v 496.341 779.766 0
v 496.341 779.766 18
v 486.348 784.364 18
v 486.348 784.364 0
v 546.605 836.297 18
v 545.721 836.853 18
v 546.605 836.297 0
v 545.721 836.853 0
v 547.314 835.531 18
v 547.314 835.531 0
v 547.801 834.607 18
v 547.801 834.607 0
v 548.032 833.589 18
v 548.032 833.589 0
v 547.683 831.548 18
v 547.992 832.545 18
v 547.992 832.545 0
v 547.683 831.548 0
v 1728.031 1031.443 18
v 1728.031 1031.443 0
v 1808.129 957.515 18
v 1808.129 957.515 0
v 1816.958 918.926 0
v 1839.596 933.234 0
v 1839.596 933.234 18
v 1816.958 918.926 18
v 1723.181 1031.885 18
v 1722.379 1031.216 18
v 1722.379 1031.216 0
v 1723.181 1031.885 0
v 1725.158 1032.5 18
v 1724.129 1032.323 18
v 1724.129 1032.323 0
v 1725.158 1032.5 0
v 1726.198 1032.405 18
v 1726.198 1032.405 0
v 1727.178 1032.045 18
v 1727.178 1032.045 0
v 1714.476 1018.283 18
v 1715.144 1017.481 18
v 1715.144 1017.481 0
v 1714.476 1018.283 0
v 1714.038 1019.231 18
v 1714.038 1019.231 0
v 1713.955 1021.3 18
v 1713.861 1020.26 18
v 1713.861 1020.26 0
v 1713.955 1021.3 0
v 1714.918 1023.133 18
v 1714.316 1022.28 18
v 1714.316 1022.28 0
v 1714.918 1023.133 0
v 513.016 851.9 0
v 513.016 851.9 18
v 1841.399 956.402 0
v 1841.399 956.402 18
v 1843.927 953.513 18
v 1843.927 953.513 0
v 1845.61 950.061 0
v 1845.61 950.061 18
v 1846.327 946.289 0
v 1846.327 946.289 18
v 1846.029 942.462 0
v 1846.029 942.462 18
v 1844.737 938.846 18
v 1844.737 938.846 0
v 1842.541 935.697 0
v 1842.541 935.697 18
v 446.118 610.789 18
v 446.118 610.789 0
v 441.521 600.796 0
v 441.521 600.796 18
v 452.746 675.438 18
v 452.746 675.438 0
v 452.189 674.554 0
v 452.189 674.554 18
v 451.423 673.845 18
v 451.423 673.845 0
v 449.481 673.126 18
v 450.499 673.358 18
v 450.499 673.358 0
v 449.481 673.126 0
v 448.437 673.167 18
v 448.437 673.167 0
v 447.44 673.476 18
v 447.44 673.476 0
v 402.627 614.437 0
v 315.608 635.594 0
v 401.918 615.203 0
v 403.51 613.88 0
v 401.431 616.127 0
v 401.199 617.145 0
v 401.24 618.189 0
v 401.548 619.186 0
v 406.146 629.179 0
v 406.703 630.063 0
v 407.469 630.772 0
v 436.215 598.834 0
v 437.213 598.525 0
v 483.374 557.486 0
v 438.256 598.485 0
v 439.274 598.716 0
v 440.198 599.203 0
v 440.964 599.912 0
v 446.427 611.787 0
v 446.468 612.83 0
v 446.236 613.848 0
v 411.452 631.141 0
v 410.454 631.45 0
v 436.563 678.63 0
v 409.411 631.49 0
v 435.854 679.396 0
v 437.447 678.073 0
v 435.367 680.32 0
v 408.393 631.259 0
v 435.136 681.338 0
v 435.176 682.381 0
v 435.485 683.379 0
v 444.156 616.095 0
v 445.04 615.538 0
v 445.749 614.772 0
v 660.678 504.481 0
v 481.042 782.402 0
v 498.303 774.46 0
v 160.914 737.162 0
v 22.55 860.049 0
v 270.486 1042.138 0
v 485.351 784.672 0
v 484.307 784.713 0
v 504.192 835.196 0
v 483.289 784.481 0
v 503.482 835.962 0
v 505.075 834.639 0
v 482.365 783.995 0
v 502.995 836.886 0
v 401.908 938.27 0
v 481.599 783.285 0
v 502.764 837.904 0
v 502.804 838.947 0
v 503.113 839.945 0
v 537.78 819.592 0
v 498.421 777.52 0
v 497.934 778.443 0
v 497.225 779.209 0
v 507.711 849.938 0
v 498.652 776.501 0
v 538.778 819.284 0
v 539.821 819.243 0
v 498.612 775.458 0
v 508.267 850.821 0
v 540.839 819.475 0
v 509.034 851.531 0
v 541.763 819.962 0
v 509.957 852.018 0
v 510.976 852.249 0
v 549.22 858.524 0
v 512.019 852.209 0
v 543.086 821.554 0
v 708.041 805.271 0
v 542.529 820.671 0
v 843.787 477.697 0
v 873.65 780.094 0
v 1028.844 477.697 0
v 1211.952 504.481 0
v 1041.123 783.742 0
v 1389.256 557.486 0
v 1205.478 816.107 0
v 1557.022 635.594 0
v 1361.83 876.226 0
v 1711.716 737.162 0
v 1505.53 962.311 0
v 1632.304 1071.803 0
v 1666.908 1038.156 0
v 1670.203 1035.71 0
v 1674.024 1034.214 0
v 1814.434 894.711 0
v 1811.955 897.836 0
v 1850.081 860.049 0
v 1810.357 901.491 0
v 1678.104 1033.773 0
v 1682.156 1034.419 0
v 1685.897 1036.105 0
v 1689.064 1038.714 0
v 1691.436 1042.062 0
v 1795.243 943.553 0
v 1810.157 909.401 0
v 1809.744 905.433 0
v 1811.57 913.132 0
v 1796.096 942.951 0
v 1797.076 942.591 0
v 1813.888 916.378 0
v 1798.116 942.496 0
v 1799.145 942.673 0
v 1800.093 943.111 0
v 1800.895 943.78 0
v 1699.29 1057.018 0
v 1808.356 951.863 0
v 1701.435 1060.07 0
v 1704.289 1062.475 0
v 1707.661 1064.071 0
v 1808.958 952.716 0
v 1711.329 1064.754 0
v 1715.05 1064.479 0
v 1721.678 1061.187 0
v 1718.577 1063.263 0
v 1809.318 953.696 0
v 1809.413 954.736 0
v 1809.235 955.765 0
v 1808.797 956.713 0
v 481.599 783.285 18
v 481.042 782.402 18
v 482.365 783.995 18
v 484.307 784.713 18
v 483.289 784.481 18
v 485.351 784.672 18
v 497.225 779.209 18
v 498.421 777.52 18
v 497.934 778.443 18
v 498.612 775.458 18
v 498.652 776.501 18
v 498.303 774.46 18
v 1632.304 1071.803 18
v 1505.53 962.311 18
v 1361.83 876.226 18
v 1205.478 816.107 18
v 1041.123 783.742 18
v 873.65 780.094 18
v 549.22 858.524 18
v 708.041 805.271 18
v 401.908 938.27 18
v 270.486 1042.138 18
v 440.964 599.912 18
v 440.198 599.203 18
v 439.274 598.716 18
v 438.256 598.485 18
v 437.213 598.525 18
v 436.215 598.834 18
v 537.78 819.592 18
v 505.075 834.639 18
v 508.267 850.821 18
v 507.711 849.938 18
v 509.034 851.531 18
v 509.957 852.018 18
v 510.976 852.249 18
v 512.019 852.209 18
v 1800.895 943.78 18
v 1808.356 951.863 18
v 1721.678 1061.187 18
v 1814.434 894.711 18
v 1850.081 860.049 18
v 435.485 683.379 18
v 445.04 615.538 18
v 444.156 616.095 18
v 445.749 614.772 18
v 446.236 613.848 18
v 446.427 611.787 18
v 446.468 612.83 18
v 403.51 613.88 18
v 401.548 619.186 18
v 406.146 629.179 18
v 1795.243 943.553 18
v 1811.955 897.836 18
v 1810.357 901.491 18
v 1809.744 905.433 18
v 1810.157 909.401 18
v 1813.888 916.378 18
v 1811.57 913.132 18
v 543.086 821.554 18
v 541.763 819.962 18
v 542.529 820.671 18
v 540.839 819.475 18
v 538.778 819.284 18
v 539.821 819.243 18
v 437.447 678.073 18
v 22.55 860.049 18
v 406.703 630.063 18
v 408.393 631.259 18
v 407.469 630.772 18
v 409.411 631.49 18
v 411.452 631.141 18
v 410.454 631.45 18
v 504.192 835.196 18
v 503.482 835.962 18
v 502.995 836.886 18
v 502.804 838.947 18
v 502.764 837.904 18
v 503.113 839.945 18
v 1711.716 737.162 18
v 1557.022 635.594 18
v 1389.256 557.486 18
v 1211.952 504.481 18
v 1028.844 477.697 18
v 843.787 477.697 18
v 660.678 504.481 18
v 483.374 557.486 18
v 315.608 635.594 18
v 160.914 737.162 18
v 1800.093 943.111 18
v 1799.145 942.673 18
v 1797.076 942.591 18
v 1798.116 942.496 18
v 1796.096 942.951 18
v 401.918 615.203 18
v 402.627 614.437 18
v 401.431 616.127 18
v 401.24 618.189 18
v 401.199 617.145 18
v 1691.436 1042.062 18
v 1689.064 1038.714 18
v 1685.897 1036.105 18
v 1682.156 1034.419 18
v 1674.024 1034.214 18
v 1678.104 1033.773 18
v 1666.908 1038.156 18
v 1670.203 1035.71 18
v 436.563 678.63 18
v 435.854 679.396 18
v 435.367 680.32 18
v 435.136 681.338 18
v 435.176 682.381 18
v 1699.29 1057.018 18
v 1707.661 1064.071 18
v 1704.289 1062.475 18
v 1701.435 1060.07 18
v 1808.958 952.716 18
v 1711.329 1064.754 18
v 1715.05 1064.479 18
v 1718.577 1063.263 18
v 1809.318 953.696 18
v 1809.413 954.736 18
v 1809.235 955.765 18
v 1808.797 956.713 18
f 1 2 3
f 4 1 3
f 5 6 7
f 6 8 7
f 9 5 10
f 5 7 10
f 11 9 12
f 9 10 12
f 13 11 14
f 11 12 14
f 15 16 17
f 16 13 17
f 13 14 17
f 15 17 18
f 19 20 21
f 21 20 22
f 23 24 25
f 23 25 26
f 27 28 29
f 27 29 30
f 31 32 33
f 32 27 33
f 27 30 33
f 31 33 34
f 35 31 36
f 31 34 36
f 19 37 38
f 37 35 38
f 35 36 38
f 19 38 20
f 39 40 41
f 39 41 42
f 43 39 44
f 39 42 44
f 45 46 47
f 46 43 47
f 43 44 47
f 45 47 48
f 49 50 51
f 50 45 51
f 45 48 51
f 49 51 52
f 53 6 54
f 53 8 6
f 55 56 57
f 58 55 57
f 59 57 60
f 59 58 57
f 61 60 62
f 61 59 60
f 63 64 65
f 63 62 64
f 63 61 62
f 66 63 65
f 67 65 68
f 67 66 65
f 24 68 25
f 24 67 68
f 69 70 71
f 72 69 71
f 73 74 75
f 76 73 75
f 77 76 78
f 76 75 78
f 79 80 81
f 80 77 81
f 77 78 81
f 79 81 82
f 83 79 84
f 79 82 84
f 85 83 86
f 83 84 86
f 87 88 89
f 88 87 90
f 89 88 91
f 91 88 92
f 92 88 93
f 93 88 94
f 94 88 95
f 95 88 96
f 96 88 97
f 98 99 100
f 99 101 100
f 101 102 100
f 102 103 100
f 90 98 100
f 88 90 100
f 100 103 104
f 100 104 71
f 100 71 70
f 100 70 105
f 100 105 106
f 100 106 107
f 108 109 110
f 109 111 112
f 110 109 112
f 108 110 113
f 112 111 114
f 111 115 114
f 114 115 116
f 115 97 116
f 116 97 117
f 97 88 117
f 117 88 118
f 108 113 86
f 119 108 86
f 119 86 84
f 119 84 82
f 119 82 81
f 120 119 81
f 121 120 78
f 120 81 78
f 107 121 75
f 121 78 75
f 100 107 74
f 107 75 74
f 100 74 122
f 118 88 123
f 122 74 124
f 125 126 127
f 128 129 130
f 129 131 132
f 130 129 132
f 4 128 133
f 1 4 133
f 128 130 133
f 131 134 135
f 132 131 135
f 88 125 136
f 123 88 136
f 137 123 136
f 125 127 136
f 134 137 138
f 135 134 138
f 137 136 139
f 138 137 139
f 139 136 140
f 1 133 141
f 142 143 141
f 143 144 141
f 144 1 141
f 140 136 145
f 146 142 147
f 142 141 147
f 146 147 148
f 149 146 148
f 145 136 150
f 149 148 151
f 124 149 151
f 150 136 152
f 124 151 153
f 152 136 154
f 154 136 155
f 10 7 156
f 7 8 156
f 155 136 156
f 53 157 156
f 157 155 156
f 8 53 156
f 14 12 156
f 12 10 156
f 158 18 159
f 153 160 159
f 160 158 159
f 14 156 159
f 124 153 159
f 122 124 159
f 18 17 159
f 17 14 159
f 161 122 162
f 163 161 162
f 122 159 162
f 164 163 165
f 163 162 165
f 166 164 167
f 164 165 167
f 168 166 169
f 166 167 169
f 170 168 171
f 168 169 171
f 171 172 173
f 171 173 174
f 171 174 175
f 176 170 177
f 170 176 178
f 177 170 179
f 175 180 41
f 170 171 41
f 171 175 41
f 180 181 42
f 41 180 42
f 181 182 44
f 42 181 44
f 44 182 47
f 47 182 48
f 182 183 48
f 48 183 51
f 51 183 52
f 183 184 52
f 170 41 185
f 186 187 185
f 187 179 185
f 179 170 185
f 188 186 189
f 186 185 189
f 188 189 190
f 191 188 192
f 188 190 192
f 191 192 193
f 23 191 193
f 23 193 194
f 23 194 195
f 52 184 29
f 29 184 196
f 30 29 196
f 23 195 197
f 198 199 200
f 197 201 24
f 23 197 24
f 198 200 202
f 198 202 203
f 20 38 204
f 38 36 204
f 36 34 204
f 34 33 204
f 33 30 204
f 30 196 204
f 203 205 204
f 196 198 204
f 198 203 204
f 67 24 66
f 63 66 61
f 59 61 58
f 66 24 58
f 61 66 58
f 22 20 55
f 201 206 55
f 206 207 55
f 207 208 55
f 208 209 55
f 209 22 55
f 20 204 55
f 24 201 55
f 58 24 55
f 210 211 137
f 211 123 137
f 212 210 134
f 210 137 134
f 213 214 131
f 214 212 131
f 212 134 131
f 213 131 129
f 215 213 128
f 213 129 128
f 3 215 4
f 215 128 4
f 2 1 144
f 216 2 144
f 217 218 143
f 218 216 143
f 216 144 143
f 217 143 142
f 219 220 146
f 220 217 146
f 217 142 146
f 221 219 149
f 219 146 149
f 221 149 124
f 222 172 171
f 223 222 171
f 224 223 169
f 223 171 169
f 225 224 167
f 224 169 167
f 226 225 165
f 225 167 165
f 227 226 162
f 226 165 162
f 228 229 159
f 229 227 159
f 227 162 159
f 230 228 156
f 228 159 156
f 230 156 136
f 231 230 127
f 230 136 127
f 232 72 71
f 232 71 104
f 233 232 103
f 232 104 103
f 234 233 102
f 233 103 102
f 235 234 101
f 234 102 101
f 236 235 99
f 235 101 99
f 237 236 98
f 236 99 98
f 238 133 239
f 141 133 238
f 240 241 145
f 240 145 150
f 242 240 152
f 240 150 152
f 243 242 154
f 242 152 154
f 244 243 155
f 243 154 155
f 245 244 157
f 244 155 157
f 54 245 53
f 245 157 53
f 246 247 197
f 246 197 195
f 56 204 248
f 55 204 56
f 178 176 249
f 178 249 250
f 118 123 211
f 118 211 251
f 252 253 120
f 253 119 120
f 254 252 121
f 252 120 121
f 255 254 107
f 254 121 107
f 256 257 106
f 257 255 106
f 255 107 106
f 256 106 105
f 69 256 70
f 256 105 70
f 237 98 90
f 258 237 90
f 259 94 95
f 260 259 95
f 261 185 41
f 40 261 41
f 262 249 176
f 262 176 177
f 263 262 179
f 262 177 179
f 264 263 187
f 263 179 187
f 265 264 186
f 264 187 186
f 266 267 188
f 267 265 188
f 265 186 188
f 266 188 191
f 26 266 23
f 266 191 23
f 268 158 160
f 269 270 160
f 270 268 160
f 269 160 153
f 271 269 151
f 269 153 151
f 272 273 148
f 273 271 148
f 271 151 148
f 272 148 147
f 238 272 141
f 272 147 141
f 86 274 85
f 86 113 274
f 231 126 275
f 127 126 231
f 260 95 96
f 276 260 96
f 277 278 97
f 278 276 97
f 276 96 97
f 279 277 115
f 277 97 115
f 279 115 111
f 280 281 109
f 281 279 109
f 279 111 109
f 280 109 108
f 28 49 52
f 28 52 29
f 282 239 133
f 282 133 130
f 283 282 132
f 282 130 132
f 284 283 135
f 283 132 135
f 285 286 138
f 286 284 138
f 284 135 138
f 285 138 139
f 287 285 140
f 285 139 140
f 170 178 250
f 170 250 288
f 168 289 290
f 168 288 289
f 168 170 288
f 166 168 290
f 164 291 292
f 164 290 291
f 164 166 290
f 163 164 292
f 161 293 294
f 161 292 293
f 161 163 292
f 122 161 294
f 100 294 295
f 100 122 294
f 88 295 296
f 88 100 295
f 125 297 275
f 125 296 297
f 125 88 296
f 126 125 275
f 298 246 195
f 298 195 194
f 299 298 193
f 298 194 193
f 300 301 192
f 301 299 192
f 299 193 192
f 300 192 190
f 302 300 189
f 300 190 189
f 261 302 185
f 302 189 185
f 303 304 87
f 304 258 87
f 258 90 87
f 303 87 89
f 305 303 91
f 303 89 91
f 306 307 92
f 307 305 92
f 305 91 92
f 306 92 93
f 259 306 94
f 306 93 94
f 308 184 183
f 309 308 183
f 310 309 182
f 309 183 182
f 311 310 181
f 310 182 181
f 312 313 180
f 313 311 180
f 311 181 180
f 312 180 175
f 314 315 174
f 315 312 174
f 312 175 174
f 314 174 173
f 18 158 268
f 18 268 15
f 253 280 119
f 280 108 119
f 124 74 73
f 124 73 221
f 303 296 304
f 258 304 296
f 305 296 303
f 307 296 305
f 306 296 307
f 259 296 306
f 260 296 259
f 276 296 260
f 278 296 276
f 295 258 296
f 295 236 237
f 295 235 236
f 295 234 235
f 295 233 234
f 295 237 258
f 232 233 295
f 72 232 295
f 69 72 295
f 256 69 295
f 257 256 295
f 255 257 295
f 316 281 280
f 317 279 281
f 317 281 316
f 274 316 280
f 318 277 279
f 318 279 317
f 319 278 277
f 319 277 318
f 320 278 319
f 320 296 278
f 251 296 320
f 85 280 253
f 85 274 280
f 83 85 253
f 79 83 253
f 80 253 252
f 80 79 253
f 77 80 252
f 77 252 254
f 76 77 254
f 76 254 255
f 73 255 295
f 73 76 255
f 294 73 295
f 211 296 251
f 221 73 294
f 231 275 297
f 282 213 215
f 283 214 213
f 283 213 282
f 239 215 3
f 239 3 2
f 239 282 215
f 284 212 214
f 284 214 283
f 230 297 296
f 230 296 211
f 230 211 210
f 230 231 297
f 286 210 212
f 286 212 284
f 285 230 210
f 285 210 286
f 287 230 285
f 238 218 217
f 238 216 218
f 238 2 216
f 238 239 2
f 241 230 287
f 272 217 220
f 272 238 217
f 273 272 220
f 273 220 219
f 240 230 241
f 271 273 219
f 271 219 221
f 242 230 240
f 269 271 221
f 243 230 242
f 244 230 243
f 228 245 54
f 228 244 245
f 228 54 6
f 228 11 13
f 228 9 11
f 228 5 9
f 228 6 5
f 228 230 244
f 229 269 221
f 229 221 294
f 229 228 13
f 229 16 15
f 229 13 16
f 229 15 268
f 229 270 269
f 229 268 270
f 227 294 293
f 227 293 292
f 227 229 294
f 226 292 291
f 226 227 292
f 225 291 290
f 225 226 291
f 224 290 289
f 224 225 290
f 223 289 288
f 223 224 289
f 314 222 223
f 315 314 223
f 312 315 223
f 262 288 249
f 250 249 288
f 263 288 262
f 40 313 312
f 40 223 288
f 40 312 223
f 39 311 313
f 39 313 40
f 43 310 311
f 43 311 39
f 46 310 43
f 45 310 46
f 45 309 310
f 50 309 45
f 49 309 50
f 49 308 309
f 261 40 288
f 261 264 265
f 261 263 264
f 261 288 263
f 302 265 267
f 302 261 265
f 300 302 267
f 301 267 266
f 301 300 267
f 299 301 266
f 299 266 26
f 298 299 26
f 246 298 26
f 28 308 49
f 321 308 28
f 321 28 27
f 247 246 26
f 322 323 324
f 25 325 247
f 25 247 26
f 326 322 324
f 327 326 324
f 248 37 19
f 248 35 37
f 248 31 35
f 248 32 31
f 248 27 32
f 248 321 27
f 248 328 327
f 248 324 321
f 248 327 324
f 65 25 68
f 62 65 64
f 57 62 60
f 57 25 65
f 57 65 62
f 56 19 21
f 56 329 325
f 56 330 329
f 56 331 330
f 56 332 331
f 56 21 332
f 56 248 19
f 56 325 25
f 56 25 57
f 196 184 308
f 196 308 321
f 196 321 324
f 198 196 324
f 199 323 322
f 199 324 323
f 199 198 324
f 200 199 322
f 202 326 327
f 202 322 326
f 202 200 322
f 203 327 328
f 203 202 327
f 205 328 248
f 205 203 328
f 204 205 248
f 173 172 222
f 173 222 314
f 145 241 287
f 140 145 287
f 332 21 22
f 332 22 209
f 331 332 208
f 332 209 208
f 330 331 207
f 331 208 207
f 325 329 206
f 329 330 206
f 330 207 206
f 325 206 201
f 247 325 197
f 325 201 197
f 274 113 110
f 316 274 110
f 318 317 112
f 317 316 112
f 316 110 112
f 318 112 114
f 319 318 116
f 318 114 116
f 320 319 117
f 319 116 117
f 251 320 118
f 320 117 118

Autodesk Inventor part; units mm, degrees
ref_plane "YZ Plane" through (0, 0, 0) normal (1, 0, 0) x (0, 1, 0)
ref_plane "XZ Plane" through (0, 0, 0) normal (0, 1, 0) x (-1, 0, 0)
ref_plane "XY Plane" through (0, 0, 0) normal (0, 0, 1) x (1, 0, 0)
sketch "CONTOURS" plane through (0, 0, 0) normal (0, 0, 1) x (1, 0, 0)
  arc A0 (1666.9081, 1038.1557) -> (1691.4363, 1042.062) centre (1677.7135, 1049.2684) ccw
  line L0 (1691.4363, 1042.062) -> (1699.2902, 1057.0177)
  arc A1 (1721.6776, 1061.1873) -> (1699.2902, 1057.0177) centre (1712.1278, 1050.2762) ccw
  line L1 (1721.6776, 1061.1873) -> (1841.3986, 956.4017)
  arc A2 (1839.5956, 933.2336) -> (1841.3986, 956.4017) centre (1831.8487, 945.4907) ccw
  line L2 (1839.5956, 933.2336) -> (1816.9578, 918.9257)
  line L3 (1814.4335, 894.7106) -> (1850.0806, 860.0494)
  arc A3 (22.5497, 860.0494) -> (1850.0806, 860.0494) centre (936.3152, 1749.5593) ccw
  line L4 (22.5497, 860.0494) -> (270.4859, 1042.1379)
  arc A4 (270.4859, 1042.1379) -> (1632.304, 1071.8026) centre (936.3091, 1749.5157) ccw
  line L5 (1632.304, 1071.8026) -> (1666.9081, 1038.1557)
  arc A5 (1816.9578, 918.9257) -> (1814.4335, 894.7106) centre (1825.2389, 905.8233) ccw
  dimension "d1" = 1275.2235
  dimension "d3" = 971.4442
sketch "HOLES" plane through (0, 0, 0) normal (0, 0, 1) x (1, 0, 0)
  line L0 (1808.3556, 951.863) -> (1800.895, 943.7797)
  arc A0 (1795.2427, 943.5532) -> (1800.895, 943.7797) centre (1797.9556, 946.4926) ccw
  line L1 (1795.2427, 943.5532) -> (1715.1445, 1017.4807)
  arc A1 (1714.9181, 1023.1331) -> (1715.1445, 1017.4807) centre (1717.8574, 1020.4201) ccw
  line L2 (1714.9181, 1023.1331) -> (1722.3786, 1031.2164)
  arc A2 (1728.031, 1031.4428) -> (1722.3786, 1031.2164) centre (1725.318, 1028.5034) ccw
  line L3 (1728.031, 1031.4428) -> (1808.1291, 957.5153)
  arc A3 (1808.3556, 951.863) -> (1808.1291, 957.5153) centre (1805.4162, 954.5759) ccw
  line L4 (543.0858, 821.5545) -> (547.6833, 831.5476)
  arc A4 (547.6833, 831.5476) -> (545.7213, 836.8533) centre (544.0494, 833.2195) ccw
  line L5 (545.7213, 836.8533) -> (513.0165, 851.8999)
  arc A5 (513.0165, 851.8999) -> (507.7108, 849.9379) centre (511.3447, 848.266) ccw
  line L6 (507.7108, 849.9379) -> (503.1133, 839.9447)
  arc A6 (503.1133, 839.9447) -> (505.0753, 834.639) centre (506.7471, 838.2729) ccw
  line L7 (505.0753, 834.639) -> (537.7801, 819.5925)
  arc A7 (537.7801, 819.5925) -> (543.0858, 821.5545) centre (539.4519, 823.2264) ccw
  line L8 (481.0423, 782.4016) -> (435.4847, 683.3788)
  arc A8 (435.4847, 683.3788) -> (437.4468, 678.0731) centre (439.1186, 681.7069) ccw
  line L9 (437.4468, 678.0731) -> (447.4399, 673.4755)
  arc A9 (447.4399, 673.4755) -> (452.7456, 675.4376) centre (449.1117, 677.1094) ccw
  line L10 (452.7456, 675.4376) -> (498.3031, 774.4603)
  arc A10 (498.3031, 774.4603) -> (496.3411, 779.766) centre (494.6693, 776.1322) ccw
  line L11 (496.3411, 779.766) -> (486.348, 784.3636)
  arc A11 (486.348, 784.3636) -> (481.0423, 782.4016) centre (484.6762, 780.7297) ccw
  line L12 (446.1185, 610.7891) -> (441.521, 600.7959)
  arc A12 (436.2153, 598.8339) -> (441.521, 600.7959) centre (437.8871, 602.4678) ccw
  line L13 (436.2153, 598.8339) -> (403.5105, 613.8804)
  arc A13 (401.5485, 619.1861) -> (403.5105, 613.8804) centre (405.1824, 617.5143) ccw
  line L14 (401.5485, 619.1861) -> (406.1461, 629.1793)
  arc A14 (411.4518, 631.1413) -> (406.1461, 629.1793) centre (409.7799, 627.5074) ccw
  line L15 (411.4518, 631.1413) -> (444.1565, 616.0948)
  arc A15 (446.1185, 610.7891) -> (444.1565, 616.0948) centre (442.4847, 612.4609) ccw
sketch "LETTERS" plane through (0, 0, 0) normal (0, 0, 1) x (1, 0, 0)
  line L0 (578.69, 694.1928) -> (578.8133, 694.0526)
  line L1 (578.8133, 694.0526) -> (578.9339, 693.9068)
  line L2 (578.9339, 693.9068) -> (579.0516, 693.7555)
  line L3 (579.0516, 693.7555) -> (579.1661, 693.5988)
  line L4 (579.1661, 693.5988) -> (579.2775, 693.4368)
  line L5 (579.2775, 693.4368) -> (579.3854, 693.2696)
  line L6 (579.3854, 693.2696) -> (579.4899, 693.0974)
  line L7 (579.4899, 693.0974) -> (579.5907, 692.9201)
  line L8 (579.5907, 692.9201) -> (579.6877, 692.7381)
  line L9 (579.6877, 692.7381) -> (579.7809, 692.5514)
  line L10 (579.7809, 692.5514) -> (579.87, 692.3601)
  line L11 (579.87, 692.3601) -> (579.955, 692.1646)
  line L12 (579.955, 692.1646) -> (580.0358, 691.9649)
  line L13 (580.0358, 691.9649) -> (580.1123, 691.7612)
  line L14 (580.1123, 691.7612) -> (580.1844, 691.5538)
  line L15 (580.1844, 691.5538) -> (580.252, 691.3428)
  line L16 (580.252, 691.3428) -> (580.3151, 691.1284)
  line L17 (580.3151, 691.1284) -> (580.3736, 690.911)
  line L18 (580.3736, 690.911) -> (580.4275, 690.6906)
  line L19 (580.4275, 690.6906) -> (580.4767, 690.4676)
  line L20 (580.4767, 690.4676) -> (580.5212, 690.2422)
  line L21 (580.5212, 690.2422) -> (580.561, 690.0145)
  line L22 (580.561, 690.0145) -> (580.596, 689.7849)
  line L23 (580.596, 689.7849) -> (580.6263, 689.5536)
  line L24 (580.6263, 689.5536) -> (580.6519, 689.3209)
  line L25 (580.6519, 689.3209) -> (580.6728, 689.0869)
  line L26 (580.6728, 689.0869) -> (580.689, 688.8519)
  line L27 (580.689, 688.8519) -> (580.7006, 688.6162)
  line L28 (580.7006, 688.6162) -> (580.7076, 688.3799)
  line L29 (580.7076, 688.3799) -> (580.71, 688.1435)
  line L30 (580.71, 688.1435) -> (580.7083, 687.9072)
  line L31 (580.7083, 687.9072) -> (580.7019, 687.6709)
  line L32 (580.7019, 687.6709) -> (580.6911, 687.4349)
  line L33 (580.6911, 687.4349) -> (580.6761, 687.1997)
  line L34 (580.6761, 687.1997) -> (580.6569, 686.9652)
  line L35 (580.6569, 686.9652) -> (580.6064, 686.4997)
  line L36 (580.6064, 686.4997) -> (580.5405, 686.0398)
  line L37 (580.5405, 686.0398) -> (580.46, 685.5872)
  line L38 (580.46, 685.5872) -> (580.3659, 685.1429)
  line L39 (580.3659, 685.1429) -> (580.259, 684.7083)
  line L40 (580.259, 684.7083) -> (580.1405, 684.2843)
  line L41 (580.1405, 684.2843) -> (580.0089, 683.8641)
  line L42 (580.0089, 683.8641) -> (579.8616, 683.4415)
  line L43 (579.8616, 683.4415) -> (579.6986, 683.0176)
  line L44 (579.6986, 683.0176) -> (579.5194, 682.5942)
  line L45 (579.5194, 682.5942) -> (579.3242, 682.1727)
  line L46 (579.3242, 682.1727) -> (579.1129, 681.7548)
  line L47 (579.1129, 681.7548) -> (579.0013, 681.5478)
  line L48 (579.0013, 681.5478) -> (578.8857, 681.3423)
  line L49 (578.8857, 681.3423) -> (578.7662, 681.1386)
  line L50 (578.7662, 681.1386) -> (578.6428, 680.9369)
  line L51 (578.6428, 680.9369) -> (578.5156, 680.7375)
  line L52 (578.5156, 680.7375) -> (578.3847, 680.5405)
  line L53 (578.3847, 680.5405) -> (578.2502, 680.3462)
  line L54 (578.2502, 680.3462) -> (578.1121, 680.1549)
  line L55 (578.1121, 680.1549) -> (577.9704, 679.9667)
  line L56 (577.9704, 679.9667) -> (577.8254, 679.7818)
  line L57 (577.8254, 679.7818) -> (577.6772, 679.6006)
  line L58 (577.6772, 679.6006) -> (577.5257, 679.4231)
  line L59 (577.5257, 679.4231) -> (577.3713, 679.2497)
  line L60 (577.3713, 679.2497) -> (577.2139, 679.0805)
  line L61 (577.2139, 679.0805) -> (577.0538, 678.9157)
  line L62 (577.0538, 678.9157) -> (576.891, 678.7555)
  line L63 (576.891, 678.7555) -> (576.7258, 678.6)
  line L64 (576.7258, 678.6) -> (576.5582, 678.4496)
  line L65 (576.5582, 678.4496) -> (576.3886, 678.3042)
  line L66 (576.3886, 678.3042) -> (576.2169, 678.1641)
  line L67 (576.2169, 678.1641) -> (576.0434, 678.0295)
  line L68 (576.0434, 678.0295) -> (575.8683, 677.9003)
  line L69 (575.8683, 677.9003) -> (575.6918, 677.7769)
  line L70 (575.6918, 677.7769) -> (575.5139, 677.6592)
  line L71 (575.5139, 677.6592) -> (575.335, 677.5474)
  line L72 (575.335, 677.5474) -> (575.1552, 677.4416)
  line L73 (575.1552, 677.4416) -> (574.9746, 677.3418)
  line L74 (574.9746, 677.3418) -> (574.7935, 677.2481)
  line L75 (574.7935, 677.2481) -> (574.612, 677.1606)
  line L76 (574.612, 677.1606) -> (574.4304, 677.0792)
  line L77 (574.4304, 677.0792) -> (574.2488, 677.004)
  line L78 (574.2488, 677.004) -> (574.0674, 676.9351)
  line L79 (574.0674, 676.9351) -> (573.8863, 676.8723)
  line L80 (573.8863, 676.8723) -> (573.7057, 676.8158)
  line L81 (573.7057, 676.8158) -> (573.5259, 676.7654)
  line L82 (573.5259, 676.7654) -> (573.3469, 676.7211)
  line L83 (573.3469, 676.7211) -> (573.1689, 676.6829)
  line L84 (573.1689, 676.6829) -> (572.9922, 676.6507)
  line L85 (572.9922, 676.6507) -> (572.8167, 676.6245)
  line L86 (572.8167, 676.6245) -> (572.6427, 676.6042)
  line L87 (572.6427, 676.6042) -> (572.4703, 676.5896)
  line L88 (572.4703, 676.5896) -> (572.2997, 676.5808)
  line L89 (572.2997, 676.5808) -> (572.1309, 676.5775)
  line L90 (572.1309, 676.5775) -> (571.964, 676.5797)
  line L91 (571.964, 676.5797) -> (571.7993, 676.5872)
  line L92 (571.7993, 676.5872) -> (571.6367, 676.6)
  line L93 (571.6367, 676.6) -> (571.4764, 676.6179)
  line L94 (571.4764, 676.6179) -> (571.3185, 676.6407)
  line L95 (571.3185, 676.6407) -> (571.163, 676.6683)
  line L96 (571.163, 676.6683) -> (571.0101, 676.7007)
  line L97 (571.0101, 676.7007) -> (570.8598, 676.7375)
  line L98 (570.8598, 676.7375) -> (570.7121, 676.7787)
  line L99 (578.4356, 694.4565) -> (578.564, 694.3275)
  line L100 (578.3049, 694.5797) -> (578.4356, 694.4565)
  line L101 (578.172, 694.6973) -> (578.3049, 694.5797)
  line L102 (578.0372, 694.8092) -> (578.172, 694.6973)
  line L103 (577.9006, 694.9153) -> (578.0372, 694.8092)
  line L104 (577.7623, 695.0157) -> (577.9006, 694.9153)
  line L105 (577.6225, 695.1104) -> (577.7623, 695.0157)
  line L106 (577.4814, 695.1995) -> (577.6225, 695.1104)
  line L107 (577.3392, 695.2829) -> (577.4814, 695.1995)
  line L108 (577.1959, 695.3608) -> (577.3392, 695.2829)
  line L109 (577.0518, 695.4331) -> (577.1959, 695.3608)
  line L110 (576.9069, 695.5) -> (577.0518, 695.4331)
  line L111 (576.7615, 695.5616) -> (576.9069, 695.5)
  line L112 (576.6156, 695.6178) -> (576.7615, 695.5616)
  line L113 (576.4695, 695.6688) -> (576.6156, 695.6178)
  line L114 (576.3232, 695.7147) -> (576.4695, 695.6688)
  line L115 (569.8928, 698.0178) -> (576.3232, 695.7147)
  line L116 (563.2082, 679.3542) -> (569.8928, 698.0178)
  line L117 (570.7121, 676.7787) -> (563.2082, 679.3542)
  line L118 (578.564, 694.3275) -> (578.69, 694.1928)
extrude "Extrusion2" add sketch "CONTOURS" along normal blind 18
extrude "Extrusion3" cut sketch "HOLES" along normal blind 18
properties part number "Platform D1" material "Wood (Birch)"
